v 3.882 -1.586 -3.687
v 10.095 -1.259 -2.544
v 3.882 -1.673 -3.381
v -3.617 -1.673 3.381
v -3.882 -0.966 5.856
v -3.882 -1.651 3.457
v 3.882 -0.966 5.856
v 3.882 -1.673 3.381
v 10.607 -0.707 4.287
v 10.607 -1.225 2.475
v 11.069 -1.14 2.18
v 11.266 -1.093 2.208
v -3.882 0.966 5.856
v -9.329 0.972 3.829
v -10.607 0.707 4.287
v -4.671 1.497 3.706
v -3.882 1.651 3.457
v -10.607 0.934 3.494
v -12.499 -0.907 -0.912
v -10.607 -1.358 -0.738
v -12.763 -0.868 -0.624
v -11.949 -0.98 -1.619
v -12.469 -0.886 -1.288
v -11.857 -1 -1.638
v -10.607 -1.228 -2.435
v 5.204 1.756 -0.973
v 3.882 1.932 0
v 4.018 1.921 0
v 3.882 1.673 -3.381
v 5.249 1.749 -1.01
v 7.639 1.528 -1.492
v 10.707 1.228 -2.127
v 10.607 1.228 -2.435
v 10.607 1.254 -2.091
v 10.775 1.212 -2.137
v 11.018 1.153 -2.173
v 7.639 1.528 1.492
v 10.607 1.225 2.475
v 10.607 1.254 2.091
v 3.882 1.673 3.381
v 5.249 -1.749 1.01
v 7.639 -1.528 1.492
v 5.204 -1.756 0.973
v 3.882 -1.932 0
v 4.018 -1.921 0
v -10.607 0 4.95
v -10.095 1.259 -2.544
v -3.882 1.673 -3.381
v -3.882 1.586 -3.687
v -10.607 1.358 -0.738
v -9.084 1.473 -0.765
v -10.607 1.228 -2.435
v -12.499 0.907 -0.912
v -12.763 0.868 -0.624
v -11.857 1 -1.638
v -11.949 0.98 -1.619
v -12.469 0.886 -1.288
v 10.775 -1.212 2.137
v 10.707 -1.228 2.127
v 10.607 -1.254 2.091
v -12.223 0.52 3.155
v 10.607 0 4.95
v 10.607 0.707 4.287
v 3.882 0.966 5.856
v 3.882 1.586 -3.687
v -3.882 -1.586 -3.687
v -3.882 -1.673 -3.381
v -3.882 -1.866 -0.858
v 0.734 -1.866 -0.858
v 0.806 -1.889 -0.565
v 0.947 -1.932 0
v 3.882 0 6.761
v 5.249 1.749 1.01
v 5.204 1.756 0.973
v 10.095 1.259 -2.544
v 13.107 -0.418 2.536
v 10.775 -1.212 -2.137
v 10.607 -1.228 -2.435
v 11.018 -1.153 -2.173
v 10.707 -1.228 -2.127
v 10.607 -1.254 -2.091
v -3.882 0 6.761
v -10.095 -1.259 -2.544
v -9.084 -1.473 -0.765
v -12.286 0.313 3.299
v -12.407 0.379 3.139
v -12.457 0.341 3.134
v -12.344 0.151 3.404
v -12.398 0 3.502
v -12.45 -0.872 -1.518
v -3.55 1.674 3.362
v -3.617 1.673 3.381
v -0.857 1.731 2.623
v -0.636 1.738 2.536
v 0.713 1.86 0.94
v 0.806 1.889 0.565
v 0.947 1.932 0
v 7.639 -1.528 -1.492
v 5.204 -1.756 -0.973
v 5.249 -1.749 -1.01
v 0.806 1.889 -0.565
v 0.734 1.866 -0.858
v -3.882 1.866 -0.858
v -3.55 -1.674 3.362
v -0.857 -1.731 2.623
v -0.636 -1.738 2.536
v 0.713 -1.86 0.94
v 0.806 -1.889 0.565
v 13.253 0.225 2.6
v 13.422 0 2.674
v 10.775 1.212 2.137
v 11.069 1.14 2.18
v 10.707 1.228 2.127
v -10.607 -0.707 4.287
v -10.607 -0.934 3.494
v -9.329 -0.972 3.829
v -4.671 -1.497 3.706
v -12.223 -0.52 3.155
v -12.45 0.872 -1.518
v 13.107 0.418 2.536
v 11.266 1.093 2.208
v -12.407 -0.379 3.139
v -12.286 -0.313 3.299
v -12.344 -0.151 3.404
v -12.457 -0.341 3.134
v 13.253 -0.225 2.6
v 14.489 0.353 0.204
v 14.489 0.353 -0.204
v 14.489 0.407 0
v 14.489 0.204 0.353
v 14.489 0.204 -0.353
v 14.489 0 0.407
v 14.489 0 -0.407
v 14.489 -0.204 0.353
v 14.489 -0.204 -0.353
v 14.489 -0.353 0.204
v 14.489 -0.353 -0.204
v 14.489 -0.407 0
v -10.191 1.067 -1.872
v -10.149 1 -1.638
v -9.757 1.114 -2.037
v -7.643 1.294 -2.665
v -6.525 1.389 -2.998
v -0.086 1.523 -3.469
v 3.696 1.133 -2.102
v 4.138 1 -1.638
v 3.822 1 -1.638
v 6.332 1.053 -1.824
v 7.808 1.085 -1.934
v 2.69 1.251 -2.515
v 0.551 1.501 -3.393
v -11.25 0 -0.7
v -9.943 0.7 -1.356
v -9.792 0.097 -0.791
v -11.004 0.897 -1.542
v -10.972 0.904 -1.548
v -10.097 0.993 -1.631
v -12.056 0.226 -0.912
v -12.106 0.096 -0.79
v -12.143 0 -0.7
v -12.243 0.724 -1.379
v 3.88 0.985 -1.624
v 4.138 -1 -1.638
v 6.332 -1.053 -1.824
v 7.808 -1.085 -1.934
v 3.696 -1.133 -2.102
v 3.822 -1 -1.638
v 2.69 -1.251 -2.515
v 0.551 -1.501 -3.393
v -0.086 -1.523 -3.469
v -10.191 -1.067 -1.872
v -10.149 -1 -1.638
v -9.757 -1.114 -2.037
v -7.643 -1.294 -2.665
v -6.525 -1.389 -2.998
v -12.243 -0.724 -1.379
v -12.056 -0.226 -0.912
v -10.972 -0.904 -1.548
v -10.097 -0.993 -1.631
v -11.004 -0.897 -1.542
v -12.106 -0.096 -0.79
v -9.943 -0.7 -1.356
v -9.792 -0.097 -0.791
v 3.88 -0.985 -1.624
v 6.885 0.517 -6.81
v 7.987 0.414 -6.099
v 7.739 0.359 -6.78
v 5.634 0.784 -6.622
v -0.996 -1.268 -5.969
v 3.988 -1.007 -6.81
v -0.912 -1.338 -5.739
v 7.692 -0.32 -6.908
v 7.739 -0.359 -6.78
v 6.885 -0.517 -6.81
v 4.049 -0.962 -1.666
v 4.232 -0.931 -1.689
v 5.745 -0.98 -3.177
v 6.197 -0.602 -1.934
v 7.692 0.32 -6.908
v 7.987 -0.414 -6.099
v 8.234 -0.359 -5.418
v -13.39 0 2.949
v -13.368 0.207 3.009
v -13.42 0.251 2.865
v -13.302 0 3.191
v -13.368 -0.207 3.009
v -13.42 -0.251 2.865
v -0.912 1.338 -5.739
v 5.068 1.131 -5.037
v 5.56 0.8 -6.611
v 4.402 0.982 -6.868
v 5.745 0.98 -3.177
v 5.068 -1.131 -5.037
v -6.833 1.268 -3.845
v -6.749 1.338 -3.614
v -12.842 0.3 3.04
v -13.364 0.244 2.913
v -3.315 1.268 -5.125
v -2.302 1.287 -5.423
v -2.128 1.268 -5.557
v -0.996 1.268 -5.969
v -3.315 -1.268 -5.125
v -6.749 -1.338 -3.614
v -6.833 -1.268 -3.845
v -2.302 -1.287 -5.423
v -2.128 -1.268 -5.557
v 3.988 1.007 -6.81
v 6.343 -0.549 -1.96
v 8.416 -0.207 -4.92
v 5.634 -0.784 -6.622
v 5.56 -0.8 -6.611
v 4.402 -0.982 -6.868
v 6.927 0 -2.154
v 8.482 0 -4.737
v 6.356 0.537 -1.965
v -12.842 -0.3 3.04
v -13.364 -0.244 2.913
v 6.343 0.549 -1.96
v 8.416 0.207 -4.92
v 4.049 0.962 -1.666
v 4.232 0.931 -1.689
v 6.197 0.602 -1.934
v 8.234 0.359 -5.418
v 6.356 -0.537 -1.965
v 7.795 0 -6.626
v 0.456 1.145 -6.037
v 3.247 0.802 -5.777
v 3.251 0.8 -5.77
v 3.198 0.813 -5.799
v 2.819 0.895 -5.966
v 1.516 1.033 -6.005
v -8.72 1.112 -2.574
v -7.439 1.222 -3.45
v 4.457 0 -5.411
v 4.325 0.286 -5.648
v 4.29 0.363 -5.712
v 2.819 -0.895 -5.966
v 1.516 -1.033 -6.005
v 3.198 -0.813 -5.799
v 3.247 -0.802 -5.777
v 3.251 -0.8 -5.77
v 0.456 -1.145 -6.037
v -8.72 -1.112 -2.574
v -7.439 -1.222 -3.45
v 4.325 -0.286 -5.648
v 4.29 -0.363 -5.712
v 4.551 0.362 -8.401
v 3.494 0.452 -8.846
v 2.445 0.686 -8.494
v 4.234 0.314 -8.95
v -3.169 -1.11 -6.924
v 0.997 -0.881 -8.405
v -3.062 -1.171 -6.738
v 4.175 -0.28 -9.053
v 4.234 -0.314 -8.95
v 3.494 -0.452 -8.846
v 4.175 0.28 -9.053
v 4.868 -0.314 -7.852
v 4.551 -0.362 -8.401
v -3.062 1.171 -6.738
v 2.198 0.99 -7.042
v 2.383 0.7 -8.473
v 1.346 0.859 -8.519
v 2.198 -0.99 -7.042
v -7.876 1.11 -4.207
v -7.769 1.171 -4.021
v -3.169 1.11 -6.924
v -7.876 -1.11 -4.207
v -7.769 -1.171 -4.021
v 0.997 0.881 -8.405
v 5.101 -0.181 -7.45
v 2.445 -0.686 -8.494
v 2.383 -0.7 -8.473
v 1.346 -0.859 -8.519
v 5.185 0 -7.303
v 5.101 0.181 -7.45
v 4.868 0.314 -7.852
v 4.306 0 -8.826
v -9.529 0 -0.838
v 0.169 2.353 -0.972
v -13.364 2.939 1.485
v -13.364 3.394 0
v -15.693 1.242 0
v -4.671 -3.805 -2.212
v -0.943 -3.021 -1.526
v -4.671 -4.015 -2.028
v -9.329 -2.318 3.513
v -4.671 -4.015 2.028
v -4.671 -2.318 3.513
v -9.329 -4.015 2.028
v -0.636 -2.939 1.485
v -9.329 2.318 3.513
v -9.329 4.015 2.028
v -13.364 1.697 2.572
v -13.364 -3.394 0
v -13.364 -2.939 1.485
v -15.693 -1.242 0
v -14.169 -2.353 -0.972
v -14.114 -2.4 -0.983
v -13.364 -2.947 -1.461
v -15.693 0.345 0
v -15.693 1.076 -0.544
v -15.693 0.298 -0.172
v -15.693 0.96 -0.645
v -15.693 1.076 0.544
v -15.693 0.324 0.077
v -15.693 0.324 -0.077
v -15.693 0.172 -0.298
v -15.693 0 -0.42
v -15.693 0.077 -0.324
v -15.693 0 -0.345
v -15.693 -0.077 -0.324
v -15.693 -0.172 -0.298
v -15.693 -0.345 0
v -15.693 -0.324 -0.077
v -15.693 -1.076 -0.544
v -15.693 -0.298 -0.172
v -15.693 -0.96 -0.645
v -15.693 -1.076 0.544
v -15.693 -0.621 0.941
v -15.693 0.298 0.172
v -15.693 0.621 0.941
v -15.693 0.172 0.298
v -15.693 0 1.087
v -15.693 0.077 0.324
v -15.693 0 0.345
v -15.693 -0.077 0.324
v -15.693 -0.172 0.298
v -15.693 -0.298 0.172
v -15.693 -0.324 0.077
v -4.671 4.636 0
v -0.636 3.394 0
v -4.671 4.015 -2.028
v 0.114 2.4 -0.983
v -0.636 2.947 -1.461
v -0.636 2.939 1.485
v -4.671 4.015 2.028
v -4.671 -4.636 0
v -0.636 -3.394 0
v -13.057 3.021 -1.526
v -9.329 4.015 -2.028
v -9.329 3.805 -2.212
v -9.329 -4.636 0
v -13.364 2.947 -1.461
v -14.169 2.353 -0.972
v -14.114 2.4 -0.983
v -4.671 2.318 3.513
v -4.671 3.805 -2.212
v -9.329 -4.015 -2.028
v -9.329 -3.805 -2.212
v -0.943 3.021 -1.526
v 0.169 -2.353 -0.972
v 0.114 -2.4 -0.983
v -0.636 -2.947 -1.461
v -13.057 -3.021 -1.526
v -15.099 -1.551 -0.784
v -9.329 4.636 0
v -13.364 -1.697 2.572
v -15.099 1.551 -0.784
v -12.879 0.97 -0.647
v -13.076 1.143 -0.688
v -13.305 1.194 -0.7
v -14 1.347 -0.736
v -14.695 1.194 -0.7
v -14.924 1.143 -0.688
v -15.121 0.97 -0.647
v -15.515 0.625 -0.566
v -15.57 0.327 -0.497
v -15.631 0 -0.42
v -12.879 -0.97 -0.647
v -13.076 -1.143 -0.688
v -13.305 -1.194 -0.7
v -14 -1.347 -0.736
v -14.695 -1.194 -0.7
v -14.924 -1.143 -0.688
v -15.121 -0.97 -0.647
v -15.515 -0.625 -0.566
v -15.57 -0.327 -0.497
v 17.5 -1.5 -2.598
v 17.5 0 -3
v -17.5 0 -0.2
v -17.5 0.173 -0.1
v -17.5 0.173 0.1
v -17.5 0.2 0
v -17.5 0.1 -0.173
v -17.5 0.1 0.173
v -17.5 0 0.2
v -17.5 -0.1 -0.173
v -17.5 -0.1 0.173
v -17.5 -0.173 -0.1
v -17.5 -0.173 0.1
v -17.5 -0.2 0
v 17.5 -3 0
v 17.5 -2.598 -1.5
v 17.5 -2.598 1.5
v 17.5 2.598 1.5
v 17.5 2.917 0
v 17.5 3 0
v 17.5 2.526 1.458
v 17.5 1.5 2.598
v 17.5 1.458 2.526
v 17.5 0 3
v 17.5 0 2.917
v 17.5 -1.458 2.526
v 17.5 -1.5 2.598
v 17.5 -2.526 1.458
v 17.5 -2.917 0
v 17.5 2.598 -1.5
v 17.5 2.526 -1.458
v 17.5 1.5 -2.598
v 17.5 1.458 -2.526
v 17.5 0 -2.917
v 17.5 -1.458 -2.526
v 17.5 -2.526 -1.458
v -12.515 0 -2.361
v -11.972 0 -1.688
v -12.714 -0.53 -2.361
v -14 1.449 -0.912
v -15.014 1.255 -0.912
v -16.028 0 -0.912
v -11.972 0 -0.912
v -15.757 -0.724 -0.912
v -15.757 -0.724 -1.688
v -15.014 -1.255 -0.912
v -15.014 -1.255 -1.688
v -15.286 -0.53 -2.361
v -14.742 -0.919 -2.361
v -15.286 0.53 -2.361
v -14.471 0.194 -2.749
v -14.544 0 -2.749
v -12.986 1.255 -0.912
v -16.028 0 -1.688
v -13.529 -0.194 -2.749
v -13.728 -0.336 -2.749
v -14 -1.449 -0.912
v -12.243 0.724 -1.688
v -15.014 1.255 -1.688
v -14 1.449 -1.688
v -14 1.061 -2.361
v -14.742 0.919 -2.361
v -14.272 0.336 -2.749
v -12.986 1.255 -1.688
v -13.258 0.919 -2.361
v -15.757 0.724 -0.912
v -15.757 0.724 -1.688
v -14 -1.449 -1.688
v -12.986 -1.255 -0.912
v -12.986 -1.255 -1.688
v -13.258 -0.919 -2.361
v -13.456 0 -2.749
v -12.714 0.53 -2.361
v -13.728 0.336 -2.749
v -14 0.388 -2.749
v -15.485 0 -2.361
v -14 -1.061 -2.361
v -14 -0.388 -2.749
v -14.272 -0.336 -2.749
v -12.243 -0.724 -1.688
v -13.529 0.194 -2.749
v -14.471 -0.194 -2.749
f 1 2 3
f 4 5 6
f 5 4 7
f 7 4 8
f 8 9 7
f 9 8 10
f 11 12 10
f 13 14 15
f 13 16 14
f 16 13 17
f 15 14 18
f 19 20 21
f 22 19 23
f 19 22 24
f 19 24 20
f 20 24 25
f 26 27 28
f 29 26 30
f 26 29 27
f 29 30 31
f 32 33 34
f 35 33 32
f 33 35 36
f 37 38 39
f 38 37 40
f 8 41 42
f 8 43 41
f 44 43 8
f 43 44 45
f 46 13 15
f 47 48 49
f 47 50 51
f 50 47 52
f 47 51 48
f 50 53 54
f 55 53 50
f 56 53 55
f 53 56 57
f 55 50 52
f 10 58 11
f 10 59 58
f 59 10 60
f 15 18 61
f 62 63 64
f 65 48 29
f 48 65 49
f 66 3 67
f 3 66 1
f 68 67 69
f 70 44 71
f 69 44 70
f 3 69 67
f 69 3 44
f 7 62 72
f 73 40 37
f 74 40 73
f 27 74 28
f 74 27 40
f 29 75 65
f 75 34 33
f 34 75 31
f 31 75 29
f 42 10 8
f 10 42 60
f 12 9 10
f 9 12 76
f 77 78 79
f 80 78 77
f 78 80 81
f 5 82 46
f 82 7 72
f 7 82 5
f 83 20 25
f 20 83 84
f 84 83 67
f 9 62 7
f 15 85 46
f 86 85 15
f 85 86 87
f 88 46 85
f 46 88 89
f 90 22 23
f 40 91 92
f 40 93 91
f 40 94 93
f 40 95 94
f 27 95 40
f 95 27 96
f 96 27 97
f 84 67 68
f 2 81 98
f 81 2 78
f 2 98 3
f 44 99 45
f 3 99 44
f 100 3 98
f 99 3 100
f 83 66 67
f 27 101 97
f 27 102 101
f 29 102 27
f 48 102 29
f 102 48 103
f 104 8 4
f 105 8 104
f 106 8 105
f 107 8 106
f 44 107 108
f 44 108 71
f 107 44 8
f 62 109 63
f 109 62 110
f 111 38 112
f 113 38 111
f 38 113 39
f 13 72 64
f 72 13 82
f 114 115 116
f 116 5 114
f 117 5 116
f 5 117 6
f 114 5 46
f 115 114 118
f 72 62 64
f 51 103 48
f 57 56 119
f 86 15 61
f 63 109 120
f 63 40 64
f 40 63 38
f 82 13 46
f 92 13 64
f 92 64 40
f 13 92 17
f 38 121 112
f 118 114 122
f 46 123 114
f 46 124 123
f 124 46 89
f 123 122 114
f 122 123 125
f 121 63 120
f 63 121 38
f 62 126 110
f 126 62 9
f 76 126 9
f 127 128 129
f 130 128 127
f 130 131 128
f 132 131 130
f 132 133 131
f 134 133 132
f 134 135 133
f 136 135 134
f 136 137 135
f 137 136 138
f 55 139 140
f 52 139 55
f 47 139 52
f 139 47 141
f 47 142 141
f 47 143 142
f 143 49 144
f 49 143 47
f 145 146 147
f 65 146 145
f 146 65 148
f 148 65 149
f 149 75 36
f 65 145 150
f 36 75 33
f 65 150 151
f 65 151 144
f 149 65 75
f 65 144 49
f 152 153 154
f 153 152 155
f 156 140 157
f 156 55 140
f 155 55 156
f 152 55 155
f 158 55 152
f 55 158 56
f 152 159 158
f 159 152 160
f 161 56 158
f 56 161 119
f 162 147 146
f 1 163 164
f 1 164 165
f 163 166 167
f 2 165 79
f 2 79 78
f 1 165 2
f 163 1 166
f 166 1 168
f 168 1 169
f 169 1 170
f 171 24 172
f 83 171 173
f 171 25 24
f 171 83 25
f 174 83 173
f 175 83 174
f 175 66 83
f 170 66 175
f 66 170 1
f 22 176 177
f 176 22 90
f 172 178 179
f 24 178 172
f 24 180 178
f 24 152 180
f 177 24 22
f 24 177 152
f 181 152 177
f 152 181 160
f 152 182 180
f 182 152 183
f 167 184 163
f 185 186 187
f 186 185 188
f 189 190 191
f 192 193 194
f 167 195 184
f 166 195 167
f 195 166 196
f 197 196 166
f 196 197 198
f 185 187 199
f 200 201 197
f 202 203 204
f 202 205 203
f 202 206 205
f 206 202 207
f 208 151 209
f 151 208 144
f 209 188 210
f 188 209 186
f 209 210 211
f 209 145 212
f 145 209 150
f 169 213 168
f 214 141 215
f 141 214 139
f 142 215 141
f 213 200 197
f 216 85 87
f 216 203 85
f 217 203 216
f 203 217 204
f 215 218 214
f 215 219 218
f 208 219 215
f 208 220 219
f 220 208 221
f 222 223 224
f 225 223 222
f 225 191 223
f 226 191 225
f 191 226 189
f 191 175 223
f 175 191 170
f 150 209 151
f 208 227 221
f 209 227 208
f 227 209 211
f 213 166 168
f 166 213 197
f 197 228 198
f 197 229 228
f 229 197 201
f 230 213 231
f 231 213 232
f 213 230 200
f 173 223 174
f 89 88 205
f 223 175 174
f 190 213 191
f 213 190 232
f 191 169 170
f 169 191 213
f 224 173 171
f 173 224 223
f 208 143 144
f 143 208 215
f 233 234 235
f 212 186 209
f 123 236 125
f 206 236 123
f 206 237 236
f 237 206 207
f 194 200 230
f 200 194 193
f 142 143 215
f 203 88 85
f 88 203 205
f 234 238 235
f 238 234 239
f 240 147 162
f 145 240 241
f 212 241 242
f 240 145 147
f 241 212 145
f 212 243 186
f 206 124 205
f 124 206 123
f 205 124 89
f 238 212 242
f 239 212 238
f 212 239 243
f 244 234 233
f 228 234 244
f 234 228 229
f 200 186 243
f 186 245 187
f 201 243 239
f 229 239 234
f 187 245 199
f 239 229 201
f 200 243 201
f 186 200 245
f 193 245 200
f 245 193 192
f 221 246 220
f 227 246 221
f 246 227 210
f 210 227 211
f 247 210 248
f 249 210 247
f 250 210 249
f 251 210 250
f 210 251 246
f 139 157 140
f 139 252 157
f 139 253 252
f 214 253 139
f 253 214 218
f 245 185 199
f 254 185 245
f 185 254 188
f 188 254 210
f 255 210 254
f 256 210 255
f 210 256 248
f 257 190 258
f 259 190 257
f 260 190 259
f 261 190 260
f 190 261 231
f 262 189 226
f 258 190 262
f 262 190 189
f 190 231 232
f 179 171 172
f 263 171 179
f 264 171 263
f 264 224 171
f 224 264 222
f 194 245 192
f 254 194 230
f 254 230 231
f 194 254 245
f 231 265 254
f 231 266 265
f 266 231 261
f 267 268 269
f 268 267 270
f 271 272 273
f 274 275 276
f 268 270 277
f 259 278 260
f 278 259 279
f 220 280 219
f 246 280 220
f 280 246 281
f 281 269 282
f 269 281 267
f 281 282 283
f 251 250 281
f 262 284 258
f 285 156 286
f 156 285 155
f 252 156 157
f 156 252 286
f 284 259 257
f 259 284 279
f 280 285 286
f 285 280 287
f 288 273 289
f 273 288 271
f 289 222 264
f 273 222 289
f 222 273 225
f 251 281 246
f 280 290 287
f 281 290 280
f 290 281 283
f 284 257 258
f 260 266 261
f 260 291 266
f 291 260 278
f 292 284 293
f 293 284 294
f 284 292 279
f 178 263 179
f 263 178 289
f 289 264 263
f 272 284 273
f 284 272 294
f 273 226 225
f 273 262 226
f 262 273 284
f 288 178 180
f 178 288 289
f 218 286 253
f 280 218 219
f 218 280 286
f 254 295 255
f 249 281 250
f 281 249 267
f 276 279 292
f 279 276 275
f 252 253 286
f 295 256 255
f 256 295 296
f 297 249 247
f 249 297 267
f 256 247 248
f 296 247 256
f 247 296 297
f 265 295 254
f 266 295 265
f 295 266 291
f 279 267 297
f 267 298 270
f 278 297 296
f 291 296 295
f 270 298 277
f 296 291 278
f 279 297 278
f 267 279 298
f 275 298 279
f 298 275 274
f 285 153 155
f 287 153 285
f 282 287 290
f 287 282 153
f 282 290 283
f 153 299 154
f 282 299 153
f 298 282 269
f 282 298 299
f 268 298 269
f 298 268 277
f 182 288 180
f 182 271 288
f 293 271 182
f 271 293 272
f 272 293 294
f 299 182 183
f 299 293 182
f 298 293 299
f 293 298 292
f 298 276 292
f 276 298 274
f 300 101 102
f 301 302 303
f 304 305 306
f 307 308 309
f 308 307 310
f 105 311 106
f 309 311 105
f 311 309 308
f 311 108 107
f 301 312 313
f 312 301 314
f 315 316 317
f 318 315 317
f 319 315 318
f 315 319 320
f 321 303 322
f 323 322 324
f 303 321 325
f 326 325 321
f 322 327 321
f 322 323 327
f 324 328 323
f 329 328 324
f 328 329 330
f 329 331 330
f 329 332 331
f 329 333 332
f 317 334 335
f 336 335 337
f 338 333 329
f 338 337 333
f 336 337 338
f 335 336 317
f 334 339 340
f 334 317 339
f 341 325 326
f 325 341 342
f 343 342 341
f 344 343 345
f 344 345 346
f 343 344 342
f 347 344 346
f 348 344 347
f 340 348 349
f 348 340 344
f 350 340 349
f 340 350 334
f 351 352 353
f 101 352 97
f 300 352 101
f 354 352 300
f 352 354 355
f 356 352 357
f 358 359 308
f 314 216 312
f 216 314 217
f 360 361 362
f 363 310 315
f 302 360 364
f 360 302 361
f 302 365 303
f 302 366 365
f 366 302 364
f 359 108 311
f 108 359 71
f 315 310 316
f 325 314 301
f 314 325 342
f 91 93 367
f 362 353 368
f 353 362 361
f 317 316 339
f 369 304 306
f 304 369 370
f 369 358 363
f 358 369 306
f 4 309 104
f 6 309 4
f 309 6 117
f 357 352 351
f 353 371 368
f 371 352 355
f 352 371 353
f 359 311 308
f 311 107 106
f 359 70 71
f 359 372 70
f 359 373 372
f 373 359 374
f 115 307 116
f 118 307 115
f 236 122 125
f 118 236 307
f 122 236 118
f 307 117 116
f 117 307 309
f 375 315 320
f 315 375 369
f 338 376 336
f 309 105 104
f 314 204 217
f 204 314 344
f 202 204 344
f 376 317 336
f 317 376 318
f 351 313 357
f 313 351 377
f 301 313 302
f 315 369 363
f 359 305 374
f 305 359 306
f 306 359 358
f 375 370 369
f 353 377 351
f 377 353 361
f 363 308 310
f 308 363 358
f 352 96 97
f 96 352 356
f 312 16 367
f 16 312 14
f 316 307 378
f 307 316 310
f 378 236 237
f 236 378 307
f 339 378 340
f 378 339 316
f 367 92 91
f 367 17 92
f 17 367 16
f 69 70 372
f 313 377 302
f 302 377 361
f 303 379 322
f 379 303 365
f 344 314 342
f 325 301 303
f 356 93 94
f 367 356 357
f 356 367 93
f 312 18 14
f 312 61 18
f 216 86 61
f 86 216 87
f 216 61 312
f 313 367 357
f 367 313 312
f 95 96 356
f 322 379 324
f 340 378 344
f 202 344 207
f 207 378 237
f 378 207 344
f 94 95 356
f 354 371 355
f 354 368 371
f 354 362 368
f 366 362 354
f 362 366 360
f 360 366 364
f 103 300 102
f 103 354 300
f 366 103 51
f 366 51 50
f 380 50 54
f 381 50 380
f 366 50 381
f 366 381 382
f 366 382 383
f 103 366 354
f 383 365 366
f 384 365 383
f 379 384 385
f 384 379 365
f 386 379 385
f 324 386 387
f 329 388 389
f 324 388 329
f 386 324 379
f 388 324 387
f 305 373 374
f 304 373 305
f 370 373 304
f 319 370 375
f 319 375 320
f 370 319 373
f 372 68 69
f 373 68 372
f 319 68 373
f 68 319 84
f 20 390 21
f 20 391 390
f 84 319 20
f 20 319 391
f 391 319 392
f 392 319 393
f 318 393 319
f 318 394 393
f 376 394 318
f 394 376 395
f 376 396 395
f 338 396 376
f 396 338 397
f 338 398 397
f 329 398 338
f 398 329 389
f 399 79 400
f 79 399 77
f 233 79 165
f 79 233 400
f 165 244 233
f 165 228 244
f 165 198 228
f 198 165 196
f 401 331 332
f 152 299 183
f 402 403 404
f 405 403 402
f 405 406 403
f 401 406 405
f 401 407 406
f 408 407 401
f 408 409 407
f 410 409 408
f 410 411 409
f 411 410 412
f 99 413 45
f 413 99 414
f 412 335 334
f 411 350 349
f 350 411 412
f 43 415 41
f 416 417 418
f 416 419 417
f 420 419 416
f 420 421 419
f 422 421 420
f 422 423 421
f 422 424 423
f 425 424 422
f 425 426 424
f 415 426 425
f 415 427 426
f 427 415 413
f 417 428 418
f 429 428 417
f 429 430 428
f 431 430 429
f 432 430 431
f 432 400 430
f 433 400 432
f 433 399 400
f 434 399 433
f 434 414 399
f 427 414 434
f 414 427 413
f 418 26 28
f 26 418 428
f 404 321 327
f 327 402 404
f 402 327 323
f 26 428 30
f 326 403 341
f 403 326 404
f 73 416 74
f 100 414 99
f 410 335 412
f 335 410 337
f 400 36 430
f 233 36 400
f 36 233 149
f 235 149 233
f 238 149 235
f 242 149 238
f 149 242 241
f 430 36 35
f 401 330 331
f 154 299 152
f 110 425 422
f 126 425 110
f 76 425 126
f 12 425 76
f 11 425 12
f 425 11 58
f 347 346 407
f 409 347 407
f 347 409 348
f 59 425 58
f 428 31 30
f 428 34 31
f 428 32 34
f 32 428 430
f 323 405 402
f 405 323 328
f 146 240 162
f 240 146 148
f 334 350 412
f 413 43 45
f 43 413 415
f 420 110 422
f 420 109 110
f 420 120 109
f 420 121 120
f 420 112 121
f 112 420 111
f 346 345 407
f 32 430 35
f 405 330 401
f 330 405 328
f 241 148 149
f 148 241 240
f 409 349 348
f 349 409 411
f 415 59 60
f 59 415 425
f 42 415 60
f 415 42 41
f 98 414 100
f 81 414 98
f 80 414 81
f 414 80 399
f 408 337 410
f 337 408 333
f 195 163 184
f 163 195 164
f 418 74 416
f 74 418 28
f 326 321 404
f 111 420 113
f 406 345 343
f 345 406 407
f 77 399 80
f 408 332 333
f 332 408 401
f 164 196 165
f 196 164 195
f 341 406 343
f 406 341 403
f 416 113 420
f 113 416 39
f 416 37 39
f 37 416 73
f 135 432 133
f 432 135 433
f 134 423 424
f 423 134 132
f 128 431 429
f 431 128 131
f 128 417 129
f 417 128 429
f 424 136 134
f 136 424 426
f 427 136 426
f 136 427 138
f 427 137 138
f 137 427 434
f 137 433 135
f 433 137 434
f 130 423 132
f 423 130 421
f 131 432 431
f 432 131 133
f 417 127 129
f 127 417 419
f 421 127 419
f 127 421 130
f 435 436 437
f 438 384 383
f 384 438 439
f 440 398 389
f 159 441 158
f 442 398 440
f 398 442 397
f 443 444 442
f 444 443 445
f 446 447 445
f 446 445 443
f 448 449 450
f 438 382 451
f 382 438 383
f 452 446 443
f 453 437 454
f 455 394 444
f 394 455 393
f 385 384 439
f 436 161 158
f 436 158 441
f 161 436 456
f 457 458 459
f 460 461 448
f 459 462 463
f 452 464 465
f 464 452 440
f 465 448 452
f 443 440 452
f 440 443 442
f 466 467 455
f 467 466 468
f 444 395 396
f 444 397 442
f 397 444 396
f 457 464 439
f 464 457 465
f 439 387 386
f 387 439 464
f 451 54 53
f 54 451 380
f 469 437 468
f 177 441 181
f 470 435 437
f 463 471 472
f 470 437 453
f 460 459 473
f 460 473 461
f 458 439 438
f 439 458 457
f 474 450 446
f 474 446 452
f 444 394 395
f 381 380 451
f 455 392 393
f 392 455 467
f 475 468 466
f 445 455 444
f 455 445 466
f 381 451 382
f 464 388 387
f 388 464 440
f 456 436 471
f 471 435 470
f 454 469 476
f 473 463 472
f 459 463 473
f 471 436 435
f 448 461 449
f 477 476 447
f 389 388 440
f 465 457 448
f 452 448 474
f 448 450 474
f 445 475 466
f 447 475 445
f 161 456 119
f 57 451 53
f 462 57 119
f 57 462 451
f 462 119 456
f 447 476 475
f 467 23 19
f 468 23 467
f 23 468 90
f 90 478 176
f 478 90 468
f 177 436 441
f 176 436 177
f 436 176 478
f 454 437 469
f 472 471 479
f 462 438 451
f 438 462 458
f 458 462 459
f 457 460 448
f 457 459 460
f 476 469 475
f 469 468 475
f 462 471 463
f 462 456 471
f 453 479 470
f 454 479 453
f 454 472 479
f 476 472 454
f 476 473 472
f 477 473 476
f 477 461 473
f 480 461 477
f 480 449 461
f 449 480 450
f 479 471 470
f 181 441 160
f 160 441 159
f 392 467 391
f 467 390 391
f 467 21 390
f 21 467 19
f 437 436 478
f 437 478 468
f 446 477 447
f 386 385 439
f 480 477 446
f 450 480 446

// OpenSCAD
$fn=12;

module segment(x, y, z, s)
{
	translate(v = [x, y, z])
		scale(v = [0.7 * s, 0.2 * s, 1.5 * s]) {
			difference() {
				sphere(r = 10);
					translate(v = [11, 0, 0])
						cylinder(h = 30, r1 = 10, r2 = 10, center = true);
			}
		}
}

module main_body() {
	rotate(a = 180, v = [0, 0, 1])
	rotate(a = 90, v = [0, 1, 0]) {
	union() {
		segment(0, 0, 0, 1);
		rotate(a = 20, v = [0, 1, 0])
			segment(3, 0, -2, 0.8);
		rotate(a = 30, v = [0, 1, 0])
			segment(5, 0, -2, 0.7);
		rotate(a = 0, v = [0, 1, 0])
			scale(v = [1, 4, 1])
				segment(0, 0, -7, 0.6);
	}
	}
}


rotate(a = 180, v = [0, 0, 1])
union() {
main_body();
rotate(a = 90, v = [0, 1, 0]) {
	difference() {
		cylinder(h = 35, r1 = 3, r2 = 0.2, center = true);
		translate(v = [0, 0, -17])
			cylinder(h = 6, r1 = 5, r2 = 0, center = true);
	}
}
/*
translate(v = [8, 0, 5.8])
rotate(a = 20, v = [0, 1, 0])
	scale(v = [1, 0.5, 0.5])
		sphere(r = 2);
*/
translate(v = [14, 0, -1.3])
	scale(v = [1.4, 1, 1])
	sphere(r = 1.5);
}
